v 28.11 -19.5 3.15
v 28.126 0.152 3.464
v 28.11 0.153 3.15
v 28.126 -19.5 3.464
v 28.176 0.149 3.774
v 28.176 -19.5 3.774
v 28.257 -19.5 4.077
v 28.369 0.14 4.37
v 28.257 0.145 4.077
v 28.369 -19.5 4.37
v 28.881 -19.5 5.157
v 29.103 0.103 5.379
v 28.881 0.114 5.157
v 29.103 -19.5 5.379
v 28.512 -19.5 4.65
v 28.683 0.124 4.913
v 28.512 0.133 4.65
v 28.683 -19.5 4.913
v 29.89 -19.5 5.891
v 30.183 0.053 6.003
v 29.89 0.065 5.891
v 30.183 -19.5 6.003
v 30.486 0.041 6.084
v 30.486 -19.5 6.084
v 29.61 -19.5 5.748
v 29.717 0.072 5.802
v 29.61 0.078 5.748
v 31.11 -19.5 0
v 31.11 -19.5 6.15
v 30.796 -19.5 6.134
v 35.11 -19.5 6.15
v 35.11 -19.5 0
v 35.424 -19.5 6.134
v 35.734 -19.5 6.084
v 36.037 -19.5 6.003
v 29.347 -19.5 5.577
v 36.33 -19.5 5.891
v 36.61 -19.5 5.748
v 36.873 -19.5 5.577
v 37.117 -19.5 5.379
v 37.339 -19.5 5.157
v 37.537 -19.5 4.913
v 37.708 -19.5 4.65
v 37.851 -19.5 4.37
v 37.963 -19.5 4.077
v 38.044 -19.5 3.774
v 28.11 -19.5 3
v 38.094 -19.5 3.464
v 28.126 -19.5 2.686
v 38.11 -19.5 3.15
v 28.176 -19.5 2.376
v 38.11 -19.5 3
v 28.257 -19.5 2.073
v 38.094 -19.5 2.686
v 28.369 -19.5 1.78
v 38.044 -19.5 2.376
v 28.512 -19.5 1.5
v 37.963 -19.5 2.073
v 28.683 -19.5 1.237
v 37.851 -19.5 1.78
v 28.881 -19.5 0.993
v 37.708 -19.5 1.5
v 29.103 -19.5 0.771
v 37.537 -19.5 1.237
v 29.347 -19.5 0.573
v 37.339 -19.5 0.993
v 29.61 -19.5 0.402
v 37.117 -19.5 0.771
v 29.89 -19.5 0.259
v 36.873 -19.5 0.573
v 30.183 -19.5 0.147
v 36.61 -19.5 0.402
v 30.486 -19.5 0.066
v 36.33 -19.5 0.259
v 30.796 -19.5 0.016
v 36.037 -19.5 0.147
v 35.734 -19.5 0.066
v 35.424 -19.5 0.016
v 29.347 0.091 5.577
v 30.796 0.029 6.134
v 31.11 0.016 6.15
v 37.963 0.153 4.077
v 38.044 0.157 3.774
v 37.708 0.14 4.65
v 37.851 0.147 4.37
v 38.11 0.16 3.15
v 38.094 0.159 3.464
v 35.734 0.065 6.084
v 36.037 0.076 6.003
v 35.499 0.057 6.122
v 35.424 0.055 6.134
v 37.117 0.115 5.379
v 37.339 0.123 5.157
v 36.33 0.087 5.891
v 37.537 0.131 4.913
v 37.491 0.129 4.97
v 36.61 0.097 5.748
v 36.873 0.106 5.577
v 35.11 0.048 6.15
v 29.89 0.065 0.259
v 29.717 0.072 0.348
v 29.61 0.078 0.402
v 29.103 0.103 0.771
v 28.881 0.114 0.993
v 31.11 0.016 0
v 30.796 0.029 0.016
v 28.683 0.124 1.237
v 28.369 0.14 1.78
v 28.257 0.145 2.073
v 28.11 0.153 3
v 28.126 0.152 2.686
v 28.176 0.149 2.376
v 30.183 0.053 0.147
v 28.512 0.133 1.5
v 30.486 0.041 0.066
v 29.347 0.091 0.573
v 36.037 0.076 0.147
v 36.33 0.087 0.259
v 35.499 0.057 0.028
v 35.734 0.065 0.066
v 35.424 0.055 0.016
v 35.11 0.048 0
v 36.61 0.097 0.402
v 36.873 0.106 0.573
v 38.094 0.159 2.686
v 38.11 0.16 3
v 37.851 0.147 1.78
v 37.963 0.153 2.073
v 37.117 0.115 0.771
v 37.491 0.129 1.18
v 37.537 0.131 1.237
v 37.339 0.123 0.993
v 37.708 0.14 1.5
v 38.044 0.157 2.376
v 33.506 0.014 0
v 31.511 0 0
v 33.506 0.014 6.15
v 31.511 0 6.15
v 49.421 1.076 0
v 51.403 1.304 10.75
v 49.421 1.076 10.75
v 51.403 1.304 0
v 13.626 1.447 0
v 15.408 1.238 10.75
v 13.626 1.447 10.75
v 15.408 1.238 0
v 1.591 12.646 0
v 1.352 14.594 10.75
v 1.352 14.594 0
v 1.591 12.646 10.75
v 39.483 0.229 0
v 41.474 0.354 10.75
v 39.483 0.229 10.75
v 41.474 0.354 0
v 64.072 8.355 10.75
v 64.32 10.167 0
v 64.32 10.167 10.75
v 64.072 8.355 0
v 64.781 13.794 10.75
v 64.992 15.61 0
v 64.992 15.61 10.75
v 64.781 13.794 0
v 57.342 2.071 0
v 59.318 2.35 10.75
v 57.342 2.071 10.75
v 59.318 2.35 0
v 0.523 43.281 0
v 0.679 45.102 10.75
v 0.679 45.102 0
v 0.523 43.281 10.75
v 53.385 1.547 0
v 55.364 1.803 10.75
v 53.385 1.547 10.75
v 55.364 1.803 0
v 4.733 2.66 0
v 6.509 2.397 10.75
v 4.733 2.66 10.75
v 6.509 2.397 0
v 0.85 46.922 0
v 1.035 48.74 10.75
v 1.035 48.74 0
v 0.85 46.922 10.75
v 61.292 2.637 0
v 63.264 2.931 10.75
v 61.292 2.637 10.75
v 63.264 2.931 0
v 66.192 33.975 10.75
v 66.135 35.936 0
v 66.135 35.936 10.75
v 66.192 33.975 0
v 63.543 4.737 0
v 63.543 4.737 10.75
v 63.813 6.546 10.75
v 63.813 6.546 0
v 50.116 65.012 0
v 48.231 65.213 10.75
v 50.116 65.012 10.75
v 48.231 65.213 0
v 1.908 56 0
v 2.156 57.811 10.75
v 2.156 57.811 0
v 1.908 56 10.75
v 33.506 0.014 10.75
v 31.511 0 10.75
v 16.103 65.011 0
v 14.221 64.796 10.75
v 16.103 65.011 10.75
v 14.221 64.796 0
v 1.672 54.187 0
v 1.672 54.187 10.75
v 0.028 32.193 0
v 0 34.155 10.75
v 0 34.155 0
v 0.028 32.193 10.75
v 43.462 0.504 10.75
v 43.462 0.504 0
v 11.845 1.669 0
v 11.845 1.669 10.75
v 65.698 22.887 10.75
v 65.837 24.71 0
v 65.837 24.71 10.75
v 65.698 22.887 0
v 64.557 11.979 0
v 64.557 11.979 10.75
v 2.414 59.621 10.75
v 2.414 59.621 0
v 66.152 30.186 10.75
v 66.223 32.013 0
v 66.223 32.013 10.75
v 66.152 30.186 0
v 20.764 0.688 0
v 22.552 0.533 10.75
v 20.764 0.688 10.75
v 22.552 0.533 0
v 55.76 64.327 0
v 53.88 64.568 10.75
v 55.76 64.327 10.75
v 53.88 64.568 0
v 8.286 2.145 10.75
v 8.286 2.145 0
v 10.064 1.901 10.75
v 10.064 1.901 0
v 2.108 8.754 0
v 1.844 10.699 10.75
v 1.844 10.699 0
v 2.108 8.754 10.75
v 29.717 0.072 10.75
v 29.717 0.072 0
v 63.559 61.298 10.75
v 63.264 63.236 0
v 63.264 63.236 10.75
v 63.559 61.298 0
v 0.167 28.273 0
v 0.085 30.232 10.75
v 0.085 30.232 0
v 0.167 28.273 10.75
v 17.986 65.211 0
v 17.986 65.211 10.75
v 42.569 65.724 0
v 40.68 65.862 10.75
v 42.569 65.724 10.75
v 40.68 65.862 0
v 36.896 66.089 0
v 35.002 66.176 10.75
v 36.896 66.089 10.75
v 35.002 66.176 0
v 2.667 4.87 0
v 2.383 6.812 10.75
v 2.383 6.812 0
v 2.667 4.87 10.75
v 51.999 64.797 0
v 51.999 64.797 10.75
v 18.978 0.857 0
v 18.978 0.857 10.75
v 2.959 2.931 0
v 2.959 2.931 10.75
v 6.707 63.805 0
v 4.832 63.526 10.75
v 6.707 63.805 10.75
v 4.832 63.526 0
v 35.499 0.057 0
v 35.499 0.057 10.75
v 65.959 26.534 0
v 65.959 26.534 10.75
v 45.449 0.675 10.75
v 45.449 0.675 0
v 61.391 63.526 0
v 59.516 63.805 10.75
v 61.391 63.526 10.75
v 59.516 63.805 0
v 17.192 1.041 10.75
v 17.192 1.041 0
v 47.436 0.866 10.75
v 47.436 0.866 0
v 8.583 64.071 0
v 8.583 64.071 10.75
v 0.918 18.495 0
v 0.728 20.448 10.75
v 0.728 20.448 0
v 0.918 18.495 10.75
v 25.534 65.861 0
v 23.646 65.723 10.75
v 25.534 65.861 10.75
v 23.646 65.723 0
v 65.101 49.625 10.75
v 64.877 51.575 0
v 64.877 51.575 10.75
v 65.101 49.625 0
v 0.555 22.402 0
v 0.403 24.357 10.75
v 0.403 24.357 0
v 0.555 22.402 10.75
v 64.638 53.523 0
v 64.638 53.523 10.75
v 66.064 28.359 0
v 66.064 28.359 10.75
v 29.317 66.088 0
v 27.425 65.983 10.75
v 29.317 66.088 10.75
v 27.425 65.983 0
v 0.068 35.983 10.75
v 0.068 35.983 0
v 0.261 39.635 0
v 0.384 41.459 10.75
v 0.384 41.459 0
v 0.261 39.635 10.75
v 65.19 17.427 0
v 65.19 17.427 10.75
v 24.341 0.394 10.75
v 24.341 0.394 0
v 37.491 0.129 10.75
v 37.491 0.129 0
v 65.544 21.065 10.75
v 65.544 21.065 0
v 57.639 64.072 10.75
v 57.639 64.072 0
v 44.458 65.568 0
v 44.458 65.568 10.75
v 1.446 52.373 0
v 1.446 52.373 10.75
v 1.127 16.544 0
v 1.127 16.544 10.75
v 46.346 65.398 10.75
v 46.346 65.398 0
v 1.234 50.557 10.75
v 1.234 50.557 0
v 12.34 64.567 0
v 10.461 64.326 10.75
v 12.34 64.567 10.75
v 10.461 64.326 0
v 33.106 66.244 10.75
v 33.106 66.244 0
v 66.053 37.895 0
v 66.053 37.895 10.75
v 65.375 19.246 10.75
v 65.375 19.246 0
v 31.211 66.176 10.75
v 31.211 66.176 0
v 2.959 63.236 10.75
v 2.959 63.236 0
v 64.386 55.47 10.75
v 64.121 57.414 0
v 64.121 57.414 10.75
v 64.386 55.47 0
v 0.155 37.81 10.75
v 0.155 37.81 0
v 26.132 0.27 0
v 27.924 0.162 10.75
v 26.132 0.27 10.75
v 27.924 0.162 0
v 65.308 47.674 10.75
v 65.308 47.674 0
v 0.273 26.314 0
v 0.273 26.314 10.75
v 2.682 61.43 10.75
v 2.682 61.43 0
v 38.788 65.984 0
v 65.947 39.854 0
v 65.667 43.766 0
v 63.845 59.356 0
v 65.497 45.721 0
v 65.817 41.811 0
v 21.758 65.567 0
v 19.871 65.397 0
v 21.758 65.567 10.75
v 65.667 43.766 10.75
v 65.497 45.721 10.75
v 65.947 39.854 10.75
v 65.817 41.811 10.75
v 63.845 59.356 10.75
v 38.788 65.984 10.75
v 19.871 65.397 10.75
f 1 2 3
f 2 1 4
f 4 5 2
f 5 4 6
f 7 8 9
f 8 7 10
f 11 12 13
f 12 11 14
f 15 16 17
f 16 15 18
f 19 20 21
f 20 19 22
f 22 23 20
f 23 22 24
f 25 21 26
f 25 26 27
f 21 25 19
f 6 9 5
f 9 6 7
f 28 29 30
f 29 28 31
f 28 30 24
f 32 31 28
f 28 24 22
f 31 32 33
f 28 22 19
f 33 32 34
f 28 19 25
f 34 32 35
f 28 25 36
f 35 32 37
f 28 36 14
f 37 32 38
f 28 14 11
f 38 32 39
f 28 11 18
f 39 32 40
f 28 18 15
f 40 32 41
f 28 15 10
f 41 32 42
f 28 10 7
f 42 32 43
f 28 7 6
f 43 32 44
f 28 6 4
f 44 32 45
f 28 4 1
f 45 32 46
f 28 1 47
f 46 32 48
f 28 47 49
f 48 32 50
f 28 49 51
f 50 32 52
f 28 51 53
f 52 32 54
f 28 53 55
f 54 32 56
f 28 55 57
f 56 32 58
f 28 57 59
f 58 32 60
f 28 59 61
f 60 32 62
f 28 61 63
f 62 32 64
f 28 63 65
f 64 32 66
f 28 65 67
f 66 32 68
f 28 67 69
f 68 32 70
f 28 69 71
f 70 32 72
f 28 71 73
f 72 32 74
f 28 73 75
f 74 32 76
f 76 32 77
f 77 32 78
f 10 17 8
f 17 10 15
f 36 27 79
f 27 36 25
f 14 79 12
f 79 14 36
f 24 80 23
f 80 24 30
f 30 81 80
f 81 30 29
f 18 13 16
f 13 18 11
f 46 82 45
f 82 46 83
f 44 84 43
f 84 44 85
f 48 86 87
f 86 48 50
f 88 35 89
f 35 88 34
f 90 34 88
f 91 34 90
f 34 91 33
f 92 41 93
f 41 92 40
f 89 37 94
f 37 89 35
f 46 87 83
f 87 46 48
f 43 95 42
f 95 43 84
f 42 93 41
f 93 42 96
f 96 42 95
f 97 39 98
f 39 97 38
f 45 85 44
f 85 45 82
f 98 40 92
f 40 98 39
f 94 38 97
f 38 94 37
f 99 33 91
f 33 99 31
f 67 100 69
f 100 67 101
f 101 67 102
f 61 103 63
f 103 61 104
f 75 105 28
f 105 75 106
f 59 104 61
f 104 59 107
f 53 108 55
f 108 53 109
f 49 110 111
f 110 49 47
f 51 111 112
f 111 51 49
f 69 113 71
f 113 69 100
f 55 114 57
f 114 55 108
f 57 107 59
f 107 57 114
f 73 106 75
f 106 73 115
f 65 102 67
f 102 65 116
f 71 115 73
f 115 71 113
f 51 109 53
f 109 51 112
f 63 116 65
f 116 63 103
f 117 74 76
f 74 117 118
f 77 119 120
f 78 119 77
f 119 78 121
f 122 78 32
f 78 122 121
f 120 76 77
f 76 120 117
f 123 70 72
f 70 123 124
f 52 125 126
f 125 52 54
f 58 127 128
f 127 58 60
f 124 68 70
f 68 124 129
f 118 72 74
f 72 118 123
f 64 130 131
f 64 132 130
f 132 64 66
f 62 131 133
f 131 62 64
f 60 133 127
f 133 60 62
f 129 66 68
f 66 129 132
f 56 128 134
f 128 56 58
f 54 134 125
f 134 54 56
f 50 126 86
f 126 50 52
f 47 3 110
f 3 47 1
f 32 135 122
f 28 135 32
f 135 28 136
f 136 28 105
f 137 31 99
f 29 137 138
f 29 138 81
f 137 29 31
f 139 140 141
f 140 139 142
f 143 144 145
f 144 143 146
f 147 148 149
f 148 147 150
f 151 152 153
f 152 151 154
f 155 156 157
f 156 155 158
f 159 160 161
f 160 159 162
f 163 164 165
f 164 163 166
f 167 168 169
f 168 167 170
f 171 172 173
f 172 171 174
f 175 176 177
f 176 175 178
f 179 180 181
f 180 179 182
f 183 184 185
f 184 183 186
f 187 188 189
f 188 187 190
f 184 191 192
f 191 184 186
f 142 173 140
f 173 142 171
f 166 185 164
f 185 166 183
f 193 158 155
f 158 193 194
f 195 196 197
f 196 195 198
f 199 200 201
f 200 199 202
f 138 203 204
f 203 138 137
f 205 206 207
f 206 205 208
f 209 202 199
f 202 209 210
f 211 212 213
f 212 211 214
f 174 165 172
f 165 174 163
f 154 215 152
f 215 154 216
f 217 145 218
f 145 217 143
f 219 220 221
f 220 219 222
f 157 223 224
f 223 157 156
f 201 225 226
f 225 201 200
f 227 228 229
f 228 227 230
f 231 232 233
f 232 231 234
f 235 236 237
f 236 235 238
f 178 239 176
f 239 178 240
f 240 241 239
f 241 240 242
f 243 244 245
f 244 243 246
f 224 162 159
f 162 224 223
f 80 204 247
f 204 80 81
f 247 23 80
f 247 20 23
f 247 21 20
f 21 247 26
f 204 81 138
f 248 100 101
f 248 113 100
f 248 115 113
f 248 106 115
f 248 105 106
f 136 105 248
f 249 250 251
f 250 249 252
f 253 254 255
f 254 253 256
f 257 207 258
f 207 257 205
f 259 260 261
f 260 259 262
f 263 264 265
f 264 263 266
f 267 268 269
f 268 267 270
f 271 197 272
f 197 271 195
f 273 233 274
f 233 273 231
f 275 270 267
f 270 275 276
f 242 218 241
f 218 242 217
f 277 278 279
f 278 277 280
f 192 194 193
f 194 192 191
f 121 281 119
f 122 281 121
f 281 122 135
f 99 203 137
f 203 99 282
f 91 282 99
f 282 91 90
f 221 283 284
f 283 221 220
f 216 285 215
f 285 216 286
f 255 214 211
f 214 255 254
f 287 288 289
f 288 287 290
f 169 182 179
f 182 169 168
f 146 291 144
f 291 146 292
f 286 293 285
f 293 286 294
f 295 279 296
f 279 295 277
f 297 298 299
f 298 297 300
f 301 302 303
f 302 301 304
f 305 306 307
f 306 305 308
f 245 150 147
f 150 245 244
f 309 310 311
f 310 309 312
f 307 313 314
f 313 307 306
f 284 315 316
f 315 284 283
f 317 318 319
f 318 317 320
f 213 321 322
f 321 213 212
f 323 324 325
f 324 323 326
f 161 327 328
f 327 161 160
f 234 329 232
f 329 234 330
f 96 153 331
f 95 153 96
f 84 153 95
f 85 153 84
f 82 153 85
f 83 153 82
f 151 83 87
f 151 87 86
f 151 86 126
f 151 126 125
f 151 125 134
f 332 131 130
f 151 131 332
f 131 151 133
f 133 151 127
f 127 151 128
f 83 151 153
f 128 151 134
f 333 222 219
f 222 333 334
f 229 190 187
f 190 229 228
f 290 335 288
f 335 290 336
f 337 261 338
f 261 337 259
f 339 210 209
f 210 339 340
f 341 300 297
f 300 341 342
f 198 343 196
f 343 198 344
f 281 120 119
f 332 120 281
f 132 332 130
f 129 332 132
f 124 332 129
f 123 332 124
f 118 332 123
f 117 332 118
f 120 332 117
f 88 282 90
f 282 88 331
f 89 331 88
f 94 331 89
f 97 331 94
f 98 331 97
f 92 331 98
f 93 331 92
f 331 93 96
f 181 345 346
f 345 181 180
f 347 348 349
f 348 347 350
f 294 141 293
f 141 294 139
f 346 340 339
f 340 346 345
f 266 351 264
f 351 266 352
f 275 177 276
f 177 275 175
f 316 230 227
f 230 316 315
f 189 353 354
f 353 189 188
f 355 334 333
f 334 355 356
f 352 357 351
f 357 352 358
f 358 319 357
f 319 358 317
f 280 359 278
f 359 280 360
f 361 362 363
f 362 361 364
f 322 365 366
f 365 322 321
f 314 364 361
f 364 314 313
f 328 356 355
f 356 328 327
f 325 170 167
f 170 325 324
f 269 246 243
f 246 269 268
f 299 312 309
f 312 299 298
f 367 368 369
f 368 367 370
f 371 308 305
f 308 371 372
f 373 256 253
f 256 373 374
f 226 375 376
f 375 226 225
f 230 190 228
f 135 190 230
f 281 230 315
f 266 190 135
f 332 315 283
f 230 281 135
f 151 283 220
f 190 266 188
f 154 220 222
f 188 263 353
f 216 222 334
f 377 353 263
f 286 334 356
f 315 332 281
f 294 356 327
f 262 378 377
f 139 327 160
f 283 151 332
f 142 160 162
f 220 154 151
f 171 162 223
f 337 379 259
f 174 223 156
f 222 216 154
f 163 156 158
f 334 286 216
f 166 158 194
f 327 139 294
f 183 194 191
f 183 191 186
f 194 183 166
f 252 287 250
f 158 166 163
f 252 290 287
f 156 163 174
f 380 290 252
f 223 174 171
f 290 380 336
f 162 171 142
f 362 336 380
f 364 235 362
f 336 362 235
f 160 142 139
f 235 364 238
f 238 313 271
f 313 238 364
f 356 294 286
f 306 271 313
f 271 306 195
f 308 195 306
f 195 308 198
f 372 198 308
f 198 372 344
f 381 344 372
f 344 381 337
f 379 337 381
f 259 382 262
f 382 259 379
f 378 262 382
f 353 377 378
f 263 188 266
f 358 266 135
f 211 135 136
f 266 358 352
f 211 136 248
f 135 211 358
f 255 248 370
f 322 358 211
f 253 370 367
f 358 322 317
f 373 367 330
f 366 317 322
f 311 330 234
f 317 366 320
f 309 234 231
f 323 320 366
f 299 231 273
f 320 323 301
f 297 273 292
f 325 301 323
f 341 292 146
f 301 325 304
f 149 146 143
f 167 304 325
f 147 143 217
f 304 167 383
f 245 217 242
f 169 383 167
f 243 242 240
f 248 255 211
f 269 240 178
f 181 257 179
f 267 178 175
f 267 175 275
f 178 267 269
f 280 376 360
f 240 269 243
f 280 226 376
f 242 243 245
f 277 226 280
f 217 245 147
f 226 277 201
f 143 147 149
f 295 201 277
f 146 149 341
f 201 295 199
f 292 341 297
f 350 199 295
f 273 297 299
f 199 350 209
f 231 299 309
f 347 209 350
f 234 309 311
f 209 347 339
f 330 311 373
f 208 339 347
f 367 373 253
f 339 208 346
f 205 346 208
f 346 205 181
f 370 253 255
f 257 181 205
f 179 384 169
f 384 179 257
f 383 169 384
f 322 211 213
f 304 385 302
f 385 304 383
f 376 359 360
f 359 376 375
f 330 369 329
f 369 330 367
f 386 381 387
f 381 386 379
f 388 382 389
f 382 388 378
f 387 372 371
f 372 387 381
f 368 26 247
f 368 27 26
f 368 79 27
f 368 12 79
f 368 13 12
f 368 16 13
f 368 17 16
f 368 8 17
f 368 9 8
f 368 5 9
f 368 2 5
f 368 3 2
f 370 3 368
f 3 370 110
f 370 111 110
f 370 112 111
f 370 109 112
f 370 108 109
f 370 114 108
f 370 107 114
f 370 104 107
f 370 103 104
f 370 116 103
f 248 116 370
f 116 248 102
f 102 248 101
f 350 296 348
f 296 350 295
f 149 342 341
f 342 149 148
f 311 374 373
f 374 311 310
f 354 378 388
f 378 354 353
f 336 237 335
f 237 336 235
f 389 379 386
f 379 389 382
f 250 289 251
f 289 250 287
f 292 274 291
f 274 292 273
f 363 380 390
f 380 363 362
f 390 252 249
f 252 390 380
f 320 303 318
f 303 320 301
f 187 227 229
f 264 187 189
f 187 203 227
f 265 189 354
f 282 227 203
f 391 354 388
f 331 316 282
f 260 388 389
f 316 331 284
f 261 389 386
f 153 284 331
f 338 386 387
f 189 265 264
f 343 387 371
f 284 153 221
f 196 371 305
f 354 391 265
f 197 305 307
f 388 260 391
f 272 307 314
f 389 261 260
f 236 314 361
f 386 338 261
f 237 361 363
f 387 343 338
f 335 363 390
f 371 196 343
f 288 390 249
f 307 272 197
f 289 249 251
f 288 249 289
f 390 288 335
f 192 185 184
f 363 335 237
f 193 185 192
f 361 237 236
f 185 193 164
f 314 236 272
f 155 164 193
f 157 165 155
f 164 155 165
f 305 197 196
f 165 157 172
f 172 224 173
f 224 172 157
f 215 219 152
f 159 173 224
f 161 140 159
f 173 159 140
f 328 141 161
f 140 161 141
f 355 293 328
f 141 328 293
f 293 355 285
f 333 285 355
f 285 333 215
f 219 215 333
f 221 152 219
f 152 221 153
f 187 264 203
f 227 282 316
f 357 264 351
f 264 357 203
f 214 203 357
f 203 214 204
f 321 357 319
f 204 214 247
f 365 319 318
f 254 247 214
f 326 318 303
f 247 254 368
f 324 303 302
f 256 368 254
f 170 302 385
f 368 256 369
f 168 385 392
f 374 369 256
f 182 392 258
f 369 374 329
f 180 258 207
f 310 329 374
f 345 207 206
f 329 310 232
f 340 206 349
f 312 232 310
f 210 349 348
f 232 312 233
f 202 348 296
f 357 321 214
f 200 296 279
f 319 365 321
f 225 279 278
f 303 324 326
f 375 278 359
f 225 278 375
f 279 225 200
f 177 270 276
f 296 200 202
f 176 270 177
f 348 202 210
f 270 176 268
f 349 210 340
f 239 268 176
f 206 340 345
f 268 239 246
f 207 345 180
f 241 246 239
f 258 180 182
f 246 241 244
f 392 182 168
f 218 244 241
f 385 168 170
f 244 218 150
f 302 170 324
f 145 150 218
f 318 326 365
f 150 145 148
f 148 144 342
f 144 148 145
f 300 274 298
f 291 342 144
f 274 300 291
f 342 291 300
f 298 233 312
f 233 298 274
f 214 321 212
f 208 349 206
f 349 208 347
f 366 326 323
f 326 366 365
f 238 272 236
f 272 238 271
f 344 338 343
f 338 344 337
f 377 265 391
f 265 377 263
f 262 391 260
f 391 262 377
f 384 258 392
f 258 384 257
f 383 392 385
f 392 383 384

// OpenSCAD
//PowerBot Cheap wireless charger
$fn=60;
use <MCAD/boxes.scad>
usb_l = 20;
usb_w = 10;
usb_h = 6.15;


module powerbot(){
	union(){
		linear_extrude(height = 10.75, convexity = 500)
	   		import (file = "powerbot_outline.dxf", layer = "Layer_1");
		translate([66.22/2, -usb_l/2+1, usb_h/2])
			rotate([90, 90, 0])
				roundedBox([usb_h, usb_w, usb_l+1], 3, true);
	}

}

powerbot();

//roundedBox([5,6,7],1, true);
